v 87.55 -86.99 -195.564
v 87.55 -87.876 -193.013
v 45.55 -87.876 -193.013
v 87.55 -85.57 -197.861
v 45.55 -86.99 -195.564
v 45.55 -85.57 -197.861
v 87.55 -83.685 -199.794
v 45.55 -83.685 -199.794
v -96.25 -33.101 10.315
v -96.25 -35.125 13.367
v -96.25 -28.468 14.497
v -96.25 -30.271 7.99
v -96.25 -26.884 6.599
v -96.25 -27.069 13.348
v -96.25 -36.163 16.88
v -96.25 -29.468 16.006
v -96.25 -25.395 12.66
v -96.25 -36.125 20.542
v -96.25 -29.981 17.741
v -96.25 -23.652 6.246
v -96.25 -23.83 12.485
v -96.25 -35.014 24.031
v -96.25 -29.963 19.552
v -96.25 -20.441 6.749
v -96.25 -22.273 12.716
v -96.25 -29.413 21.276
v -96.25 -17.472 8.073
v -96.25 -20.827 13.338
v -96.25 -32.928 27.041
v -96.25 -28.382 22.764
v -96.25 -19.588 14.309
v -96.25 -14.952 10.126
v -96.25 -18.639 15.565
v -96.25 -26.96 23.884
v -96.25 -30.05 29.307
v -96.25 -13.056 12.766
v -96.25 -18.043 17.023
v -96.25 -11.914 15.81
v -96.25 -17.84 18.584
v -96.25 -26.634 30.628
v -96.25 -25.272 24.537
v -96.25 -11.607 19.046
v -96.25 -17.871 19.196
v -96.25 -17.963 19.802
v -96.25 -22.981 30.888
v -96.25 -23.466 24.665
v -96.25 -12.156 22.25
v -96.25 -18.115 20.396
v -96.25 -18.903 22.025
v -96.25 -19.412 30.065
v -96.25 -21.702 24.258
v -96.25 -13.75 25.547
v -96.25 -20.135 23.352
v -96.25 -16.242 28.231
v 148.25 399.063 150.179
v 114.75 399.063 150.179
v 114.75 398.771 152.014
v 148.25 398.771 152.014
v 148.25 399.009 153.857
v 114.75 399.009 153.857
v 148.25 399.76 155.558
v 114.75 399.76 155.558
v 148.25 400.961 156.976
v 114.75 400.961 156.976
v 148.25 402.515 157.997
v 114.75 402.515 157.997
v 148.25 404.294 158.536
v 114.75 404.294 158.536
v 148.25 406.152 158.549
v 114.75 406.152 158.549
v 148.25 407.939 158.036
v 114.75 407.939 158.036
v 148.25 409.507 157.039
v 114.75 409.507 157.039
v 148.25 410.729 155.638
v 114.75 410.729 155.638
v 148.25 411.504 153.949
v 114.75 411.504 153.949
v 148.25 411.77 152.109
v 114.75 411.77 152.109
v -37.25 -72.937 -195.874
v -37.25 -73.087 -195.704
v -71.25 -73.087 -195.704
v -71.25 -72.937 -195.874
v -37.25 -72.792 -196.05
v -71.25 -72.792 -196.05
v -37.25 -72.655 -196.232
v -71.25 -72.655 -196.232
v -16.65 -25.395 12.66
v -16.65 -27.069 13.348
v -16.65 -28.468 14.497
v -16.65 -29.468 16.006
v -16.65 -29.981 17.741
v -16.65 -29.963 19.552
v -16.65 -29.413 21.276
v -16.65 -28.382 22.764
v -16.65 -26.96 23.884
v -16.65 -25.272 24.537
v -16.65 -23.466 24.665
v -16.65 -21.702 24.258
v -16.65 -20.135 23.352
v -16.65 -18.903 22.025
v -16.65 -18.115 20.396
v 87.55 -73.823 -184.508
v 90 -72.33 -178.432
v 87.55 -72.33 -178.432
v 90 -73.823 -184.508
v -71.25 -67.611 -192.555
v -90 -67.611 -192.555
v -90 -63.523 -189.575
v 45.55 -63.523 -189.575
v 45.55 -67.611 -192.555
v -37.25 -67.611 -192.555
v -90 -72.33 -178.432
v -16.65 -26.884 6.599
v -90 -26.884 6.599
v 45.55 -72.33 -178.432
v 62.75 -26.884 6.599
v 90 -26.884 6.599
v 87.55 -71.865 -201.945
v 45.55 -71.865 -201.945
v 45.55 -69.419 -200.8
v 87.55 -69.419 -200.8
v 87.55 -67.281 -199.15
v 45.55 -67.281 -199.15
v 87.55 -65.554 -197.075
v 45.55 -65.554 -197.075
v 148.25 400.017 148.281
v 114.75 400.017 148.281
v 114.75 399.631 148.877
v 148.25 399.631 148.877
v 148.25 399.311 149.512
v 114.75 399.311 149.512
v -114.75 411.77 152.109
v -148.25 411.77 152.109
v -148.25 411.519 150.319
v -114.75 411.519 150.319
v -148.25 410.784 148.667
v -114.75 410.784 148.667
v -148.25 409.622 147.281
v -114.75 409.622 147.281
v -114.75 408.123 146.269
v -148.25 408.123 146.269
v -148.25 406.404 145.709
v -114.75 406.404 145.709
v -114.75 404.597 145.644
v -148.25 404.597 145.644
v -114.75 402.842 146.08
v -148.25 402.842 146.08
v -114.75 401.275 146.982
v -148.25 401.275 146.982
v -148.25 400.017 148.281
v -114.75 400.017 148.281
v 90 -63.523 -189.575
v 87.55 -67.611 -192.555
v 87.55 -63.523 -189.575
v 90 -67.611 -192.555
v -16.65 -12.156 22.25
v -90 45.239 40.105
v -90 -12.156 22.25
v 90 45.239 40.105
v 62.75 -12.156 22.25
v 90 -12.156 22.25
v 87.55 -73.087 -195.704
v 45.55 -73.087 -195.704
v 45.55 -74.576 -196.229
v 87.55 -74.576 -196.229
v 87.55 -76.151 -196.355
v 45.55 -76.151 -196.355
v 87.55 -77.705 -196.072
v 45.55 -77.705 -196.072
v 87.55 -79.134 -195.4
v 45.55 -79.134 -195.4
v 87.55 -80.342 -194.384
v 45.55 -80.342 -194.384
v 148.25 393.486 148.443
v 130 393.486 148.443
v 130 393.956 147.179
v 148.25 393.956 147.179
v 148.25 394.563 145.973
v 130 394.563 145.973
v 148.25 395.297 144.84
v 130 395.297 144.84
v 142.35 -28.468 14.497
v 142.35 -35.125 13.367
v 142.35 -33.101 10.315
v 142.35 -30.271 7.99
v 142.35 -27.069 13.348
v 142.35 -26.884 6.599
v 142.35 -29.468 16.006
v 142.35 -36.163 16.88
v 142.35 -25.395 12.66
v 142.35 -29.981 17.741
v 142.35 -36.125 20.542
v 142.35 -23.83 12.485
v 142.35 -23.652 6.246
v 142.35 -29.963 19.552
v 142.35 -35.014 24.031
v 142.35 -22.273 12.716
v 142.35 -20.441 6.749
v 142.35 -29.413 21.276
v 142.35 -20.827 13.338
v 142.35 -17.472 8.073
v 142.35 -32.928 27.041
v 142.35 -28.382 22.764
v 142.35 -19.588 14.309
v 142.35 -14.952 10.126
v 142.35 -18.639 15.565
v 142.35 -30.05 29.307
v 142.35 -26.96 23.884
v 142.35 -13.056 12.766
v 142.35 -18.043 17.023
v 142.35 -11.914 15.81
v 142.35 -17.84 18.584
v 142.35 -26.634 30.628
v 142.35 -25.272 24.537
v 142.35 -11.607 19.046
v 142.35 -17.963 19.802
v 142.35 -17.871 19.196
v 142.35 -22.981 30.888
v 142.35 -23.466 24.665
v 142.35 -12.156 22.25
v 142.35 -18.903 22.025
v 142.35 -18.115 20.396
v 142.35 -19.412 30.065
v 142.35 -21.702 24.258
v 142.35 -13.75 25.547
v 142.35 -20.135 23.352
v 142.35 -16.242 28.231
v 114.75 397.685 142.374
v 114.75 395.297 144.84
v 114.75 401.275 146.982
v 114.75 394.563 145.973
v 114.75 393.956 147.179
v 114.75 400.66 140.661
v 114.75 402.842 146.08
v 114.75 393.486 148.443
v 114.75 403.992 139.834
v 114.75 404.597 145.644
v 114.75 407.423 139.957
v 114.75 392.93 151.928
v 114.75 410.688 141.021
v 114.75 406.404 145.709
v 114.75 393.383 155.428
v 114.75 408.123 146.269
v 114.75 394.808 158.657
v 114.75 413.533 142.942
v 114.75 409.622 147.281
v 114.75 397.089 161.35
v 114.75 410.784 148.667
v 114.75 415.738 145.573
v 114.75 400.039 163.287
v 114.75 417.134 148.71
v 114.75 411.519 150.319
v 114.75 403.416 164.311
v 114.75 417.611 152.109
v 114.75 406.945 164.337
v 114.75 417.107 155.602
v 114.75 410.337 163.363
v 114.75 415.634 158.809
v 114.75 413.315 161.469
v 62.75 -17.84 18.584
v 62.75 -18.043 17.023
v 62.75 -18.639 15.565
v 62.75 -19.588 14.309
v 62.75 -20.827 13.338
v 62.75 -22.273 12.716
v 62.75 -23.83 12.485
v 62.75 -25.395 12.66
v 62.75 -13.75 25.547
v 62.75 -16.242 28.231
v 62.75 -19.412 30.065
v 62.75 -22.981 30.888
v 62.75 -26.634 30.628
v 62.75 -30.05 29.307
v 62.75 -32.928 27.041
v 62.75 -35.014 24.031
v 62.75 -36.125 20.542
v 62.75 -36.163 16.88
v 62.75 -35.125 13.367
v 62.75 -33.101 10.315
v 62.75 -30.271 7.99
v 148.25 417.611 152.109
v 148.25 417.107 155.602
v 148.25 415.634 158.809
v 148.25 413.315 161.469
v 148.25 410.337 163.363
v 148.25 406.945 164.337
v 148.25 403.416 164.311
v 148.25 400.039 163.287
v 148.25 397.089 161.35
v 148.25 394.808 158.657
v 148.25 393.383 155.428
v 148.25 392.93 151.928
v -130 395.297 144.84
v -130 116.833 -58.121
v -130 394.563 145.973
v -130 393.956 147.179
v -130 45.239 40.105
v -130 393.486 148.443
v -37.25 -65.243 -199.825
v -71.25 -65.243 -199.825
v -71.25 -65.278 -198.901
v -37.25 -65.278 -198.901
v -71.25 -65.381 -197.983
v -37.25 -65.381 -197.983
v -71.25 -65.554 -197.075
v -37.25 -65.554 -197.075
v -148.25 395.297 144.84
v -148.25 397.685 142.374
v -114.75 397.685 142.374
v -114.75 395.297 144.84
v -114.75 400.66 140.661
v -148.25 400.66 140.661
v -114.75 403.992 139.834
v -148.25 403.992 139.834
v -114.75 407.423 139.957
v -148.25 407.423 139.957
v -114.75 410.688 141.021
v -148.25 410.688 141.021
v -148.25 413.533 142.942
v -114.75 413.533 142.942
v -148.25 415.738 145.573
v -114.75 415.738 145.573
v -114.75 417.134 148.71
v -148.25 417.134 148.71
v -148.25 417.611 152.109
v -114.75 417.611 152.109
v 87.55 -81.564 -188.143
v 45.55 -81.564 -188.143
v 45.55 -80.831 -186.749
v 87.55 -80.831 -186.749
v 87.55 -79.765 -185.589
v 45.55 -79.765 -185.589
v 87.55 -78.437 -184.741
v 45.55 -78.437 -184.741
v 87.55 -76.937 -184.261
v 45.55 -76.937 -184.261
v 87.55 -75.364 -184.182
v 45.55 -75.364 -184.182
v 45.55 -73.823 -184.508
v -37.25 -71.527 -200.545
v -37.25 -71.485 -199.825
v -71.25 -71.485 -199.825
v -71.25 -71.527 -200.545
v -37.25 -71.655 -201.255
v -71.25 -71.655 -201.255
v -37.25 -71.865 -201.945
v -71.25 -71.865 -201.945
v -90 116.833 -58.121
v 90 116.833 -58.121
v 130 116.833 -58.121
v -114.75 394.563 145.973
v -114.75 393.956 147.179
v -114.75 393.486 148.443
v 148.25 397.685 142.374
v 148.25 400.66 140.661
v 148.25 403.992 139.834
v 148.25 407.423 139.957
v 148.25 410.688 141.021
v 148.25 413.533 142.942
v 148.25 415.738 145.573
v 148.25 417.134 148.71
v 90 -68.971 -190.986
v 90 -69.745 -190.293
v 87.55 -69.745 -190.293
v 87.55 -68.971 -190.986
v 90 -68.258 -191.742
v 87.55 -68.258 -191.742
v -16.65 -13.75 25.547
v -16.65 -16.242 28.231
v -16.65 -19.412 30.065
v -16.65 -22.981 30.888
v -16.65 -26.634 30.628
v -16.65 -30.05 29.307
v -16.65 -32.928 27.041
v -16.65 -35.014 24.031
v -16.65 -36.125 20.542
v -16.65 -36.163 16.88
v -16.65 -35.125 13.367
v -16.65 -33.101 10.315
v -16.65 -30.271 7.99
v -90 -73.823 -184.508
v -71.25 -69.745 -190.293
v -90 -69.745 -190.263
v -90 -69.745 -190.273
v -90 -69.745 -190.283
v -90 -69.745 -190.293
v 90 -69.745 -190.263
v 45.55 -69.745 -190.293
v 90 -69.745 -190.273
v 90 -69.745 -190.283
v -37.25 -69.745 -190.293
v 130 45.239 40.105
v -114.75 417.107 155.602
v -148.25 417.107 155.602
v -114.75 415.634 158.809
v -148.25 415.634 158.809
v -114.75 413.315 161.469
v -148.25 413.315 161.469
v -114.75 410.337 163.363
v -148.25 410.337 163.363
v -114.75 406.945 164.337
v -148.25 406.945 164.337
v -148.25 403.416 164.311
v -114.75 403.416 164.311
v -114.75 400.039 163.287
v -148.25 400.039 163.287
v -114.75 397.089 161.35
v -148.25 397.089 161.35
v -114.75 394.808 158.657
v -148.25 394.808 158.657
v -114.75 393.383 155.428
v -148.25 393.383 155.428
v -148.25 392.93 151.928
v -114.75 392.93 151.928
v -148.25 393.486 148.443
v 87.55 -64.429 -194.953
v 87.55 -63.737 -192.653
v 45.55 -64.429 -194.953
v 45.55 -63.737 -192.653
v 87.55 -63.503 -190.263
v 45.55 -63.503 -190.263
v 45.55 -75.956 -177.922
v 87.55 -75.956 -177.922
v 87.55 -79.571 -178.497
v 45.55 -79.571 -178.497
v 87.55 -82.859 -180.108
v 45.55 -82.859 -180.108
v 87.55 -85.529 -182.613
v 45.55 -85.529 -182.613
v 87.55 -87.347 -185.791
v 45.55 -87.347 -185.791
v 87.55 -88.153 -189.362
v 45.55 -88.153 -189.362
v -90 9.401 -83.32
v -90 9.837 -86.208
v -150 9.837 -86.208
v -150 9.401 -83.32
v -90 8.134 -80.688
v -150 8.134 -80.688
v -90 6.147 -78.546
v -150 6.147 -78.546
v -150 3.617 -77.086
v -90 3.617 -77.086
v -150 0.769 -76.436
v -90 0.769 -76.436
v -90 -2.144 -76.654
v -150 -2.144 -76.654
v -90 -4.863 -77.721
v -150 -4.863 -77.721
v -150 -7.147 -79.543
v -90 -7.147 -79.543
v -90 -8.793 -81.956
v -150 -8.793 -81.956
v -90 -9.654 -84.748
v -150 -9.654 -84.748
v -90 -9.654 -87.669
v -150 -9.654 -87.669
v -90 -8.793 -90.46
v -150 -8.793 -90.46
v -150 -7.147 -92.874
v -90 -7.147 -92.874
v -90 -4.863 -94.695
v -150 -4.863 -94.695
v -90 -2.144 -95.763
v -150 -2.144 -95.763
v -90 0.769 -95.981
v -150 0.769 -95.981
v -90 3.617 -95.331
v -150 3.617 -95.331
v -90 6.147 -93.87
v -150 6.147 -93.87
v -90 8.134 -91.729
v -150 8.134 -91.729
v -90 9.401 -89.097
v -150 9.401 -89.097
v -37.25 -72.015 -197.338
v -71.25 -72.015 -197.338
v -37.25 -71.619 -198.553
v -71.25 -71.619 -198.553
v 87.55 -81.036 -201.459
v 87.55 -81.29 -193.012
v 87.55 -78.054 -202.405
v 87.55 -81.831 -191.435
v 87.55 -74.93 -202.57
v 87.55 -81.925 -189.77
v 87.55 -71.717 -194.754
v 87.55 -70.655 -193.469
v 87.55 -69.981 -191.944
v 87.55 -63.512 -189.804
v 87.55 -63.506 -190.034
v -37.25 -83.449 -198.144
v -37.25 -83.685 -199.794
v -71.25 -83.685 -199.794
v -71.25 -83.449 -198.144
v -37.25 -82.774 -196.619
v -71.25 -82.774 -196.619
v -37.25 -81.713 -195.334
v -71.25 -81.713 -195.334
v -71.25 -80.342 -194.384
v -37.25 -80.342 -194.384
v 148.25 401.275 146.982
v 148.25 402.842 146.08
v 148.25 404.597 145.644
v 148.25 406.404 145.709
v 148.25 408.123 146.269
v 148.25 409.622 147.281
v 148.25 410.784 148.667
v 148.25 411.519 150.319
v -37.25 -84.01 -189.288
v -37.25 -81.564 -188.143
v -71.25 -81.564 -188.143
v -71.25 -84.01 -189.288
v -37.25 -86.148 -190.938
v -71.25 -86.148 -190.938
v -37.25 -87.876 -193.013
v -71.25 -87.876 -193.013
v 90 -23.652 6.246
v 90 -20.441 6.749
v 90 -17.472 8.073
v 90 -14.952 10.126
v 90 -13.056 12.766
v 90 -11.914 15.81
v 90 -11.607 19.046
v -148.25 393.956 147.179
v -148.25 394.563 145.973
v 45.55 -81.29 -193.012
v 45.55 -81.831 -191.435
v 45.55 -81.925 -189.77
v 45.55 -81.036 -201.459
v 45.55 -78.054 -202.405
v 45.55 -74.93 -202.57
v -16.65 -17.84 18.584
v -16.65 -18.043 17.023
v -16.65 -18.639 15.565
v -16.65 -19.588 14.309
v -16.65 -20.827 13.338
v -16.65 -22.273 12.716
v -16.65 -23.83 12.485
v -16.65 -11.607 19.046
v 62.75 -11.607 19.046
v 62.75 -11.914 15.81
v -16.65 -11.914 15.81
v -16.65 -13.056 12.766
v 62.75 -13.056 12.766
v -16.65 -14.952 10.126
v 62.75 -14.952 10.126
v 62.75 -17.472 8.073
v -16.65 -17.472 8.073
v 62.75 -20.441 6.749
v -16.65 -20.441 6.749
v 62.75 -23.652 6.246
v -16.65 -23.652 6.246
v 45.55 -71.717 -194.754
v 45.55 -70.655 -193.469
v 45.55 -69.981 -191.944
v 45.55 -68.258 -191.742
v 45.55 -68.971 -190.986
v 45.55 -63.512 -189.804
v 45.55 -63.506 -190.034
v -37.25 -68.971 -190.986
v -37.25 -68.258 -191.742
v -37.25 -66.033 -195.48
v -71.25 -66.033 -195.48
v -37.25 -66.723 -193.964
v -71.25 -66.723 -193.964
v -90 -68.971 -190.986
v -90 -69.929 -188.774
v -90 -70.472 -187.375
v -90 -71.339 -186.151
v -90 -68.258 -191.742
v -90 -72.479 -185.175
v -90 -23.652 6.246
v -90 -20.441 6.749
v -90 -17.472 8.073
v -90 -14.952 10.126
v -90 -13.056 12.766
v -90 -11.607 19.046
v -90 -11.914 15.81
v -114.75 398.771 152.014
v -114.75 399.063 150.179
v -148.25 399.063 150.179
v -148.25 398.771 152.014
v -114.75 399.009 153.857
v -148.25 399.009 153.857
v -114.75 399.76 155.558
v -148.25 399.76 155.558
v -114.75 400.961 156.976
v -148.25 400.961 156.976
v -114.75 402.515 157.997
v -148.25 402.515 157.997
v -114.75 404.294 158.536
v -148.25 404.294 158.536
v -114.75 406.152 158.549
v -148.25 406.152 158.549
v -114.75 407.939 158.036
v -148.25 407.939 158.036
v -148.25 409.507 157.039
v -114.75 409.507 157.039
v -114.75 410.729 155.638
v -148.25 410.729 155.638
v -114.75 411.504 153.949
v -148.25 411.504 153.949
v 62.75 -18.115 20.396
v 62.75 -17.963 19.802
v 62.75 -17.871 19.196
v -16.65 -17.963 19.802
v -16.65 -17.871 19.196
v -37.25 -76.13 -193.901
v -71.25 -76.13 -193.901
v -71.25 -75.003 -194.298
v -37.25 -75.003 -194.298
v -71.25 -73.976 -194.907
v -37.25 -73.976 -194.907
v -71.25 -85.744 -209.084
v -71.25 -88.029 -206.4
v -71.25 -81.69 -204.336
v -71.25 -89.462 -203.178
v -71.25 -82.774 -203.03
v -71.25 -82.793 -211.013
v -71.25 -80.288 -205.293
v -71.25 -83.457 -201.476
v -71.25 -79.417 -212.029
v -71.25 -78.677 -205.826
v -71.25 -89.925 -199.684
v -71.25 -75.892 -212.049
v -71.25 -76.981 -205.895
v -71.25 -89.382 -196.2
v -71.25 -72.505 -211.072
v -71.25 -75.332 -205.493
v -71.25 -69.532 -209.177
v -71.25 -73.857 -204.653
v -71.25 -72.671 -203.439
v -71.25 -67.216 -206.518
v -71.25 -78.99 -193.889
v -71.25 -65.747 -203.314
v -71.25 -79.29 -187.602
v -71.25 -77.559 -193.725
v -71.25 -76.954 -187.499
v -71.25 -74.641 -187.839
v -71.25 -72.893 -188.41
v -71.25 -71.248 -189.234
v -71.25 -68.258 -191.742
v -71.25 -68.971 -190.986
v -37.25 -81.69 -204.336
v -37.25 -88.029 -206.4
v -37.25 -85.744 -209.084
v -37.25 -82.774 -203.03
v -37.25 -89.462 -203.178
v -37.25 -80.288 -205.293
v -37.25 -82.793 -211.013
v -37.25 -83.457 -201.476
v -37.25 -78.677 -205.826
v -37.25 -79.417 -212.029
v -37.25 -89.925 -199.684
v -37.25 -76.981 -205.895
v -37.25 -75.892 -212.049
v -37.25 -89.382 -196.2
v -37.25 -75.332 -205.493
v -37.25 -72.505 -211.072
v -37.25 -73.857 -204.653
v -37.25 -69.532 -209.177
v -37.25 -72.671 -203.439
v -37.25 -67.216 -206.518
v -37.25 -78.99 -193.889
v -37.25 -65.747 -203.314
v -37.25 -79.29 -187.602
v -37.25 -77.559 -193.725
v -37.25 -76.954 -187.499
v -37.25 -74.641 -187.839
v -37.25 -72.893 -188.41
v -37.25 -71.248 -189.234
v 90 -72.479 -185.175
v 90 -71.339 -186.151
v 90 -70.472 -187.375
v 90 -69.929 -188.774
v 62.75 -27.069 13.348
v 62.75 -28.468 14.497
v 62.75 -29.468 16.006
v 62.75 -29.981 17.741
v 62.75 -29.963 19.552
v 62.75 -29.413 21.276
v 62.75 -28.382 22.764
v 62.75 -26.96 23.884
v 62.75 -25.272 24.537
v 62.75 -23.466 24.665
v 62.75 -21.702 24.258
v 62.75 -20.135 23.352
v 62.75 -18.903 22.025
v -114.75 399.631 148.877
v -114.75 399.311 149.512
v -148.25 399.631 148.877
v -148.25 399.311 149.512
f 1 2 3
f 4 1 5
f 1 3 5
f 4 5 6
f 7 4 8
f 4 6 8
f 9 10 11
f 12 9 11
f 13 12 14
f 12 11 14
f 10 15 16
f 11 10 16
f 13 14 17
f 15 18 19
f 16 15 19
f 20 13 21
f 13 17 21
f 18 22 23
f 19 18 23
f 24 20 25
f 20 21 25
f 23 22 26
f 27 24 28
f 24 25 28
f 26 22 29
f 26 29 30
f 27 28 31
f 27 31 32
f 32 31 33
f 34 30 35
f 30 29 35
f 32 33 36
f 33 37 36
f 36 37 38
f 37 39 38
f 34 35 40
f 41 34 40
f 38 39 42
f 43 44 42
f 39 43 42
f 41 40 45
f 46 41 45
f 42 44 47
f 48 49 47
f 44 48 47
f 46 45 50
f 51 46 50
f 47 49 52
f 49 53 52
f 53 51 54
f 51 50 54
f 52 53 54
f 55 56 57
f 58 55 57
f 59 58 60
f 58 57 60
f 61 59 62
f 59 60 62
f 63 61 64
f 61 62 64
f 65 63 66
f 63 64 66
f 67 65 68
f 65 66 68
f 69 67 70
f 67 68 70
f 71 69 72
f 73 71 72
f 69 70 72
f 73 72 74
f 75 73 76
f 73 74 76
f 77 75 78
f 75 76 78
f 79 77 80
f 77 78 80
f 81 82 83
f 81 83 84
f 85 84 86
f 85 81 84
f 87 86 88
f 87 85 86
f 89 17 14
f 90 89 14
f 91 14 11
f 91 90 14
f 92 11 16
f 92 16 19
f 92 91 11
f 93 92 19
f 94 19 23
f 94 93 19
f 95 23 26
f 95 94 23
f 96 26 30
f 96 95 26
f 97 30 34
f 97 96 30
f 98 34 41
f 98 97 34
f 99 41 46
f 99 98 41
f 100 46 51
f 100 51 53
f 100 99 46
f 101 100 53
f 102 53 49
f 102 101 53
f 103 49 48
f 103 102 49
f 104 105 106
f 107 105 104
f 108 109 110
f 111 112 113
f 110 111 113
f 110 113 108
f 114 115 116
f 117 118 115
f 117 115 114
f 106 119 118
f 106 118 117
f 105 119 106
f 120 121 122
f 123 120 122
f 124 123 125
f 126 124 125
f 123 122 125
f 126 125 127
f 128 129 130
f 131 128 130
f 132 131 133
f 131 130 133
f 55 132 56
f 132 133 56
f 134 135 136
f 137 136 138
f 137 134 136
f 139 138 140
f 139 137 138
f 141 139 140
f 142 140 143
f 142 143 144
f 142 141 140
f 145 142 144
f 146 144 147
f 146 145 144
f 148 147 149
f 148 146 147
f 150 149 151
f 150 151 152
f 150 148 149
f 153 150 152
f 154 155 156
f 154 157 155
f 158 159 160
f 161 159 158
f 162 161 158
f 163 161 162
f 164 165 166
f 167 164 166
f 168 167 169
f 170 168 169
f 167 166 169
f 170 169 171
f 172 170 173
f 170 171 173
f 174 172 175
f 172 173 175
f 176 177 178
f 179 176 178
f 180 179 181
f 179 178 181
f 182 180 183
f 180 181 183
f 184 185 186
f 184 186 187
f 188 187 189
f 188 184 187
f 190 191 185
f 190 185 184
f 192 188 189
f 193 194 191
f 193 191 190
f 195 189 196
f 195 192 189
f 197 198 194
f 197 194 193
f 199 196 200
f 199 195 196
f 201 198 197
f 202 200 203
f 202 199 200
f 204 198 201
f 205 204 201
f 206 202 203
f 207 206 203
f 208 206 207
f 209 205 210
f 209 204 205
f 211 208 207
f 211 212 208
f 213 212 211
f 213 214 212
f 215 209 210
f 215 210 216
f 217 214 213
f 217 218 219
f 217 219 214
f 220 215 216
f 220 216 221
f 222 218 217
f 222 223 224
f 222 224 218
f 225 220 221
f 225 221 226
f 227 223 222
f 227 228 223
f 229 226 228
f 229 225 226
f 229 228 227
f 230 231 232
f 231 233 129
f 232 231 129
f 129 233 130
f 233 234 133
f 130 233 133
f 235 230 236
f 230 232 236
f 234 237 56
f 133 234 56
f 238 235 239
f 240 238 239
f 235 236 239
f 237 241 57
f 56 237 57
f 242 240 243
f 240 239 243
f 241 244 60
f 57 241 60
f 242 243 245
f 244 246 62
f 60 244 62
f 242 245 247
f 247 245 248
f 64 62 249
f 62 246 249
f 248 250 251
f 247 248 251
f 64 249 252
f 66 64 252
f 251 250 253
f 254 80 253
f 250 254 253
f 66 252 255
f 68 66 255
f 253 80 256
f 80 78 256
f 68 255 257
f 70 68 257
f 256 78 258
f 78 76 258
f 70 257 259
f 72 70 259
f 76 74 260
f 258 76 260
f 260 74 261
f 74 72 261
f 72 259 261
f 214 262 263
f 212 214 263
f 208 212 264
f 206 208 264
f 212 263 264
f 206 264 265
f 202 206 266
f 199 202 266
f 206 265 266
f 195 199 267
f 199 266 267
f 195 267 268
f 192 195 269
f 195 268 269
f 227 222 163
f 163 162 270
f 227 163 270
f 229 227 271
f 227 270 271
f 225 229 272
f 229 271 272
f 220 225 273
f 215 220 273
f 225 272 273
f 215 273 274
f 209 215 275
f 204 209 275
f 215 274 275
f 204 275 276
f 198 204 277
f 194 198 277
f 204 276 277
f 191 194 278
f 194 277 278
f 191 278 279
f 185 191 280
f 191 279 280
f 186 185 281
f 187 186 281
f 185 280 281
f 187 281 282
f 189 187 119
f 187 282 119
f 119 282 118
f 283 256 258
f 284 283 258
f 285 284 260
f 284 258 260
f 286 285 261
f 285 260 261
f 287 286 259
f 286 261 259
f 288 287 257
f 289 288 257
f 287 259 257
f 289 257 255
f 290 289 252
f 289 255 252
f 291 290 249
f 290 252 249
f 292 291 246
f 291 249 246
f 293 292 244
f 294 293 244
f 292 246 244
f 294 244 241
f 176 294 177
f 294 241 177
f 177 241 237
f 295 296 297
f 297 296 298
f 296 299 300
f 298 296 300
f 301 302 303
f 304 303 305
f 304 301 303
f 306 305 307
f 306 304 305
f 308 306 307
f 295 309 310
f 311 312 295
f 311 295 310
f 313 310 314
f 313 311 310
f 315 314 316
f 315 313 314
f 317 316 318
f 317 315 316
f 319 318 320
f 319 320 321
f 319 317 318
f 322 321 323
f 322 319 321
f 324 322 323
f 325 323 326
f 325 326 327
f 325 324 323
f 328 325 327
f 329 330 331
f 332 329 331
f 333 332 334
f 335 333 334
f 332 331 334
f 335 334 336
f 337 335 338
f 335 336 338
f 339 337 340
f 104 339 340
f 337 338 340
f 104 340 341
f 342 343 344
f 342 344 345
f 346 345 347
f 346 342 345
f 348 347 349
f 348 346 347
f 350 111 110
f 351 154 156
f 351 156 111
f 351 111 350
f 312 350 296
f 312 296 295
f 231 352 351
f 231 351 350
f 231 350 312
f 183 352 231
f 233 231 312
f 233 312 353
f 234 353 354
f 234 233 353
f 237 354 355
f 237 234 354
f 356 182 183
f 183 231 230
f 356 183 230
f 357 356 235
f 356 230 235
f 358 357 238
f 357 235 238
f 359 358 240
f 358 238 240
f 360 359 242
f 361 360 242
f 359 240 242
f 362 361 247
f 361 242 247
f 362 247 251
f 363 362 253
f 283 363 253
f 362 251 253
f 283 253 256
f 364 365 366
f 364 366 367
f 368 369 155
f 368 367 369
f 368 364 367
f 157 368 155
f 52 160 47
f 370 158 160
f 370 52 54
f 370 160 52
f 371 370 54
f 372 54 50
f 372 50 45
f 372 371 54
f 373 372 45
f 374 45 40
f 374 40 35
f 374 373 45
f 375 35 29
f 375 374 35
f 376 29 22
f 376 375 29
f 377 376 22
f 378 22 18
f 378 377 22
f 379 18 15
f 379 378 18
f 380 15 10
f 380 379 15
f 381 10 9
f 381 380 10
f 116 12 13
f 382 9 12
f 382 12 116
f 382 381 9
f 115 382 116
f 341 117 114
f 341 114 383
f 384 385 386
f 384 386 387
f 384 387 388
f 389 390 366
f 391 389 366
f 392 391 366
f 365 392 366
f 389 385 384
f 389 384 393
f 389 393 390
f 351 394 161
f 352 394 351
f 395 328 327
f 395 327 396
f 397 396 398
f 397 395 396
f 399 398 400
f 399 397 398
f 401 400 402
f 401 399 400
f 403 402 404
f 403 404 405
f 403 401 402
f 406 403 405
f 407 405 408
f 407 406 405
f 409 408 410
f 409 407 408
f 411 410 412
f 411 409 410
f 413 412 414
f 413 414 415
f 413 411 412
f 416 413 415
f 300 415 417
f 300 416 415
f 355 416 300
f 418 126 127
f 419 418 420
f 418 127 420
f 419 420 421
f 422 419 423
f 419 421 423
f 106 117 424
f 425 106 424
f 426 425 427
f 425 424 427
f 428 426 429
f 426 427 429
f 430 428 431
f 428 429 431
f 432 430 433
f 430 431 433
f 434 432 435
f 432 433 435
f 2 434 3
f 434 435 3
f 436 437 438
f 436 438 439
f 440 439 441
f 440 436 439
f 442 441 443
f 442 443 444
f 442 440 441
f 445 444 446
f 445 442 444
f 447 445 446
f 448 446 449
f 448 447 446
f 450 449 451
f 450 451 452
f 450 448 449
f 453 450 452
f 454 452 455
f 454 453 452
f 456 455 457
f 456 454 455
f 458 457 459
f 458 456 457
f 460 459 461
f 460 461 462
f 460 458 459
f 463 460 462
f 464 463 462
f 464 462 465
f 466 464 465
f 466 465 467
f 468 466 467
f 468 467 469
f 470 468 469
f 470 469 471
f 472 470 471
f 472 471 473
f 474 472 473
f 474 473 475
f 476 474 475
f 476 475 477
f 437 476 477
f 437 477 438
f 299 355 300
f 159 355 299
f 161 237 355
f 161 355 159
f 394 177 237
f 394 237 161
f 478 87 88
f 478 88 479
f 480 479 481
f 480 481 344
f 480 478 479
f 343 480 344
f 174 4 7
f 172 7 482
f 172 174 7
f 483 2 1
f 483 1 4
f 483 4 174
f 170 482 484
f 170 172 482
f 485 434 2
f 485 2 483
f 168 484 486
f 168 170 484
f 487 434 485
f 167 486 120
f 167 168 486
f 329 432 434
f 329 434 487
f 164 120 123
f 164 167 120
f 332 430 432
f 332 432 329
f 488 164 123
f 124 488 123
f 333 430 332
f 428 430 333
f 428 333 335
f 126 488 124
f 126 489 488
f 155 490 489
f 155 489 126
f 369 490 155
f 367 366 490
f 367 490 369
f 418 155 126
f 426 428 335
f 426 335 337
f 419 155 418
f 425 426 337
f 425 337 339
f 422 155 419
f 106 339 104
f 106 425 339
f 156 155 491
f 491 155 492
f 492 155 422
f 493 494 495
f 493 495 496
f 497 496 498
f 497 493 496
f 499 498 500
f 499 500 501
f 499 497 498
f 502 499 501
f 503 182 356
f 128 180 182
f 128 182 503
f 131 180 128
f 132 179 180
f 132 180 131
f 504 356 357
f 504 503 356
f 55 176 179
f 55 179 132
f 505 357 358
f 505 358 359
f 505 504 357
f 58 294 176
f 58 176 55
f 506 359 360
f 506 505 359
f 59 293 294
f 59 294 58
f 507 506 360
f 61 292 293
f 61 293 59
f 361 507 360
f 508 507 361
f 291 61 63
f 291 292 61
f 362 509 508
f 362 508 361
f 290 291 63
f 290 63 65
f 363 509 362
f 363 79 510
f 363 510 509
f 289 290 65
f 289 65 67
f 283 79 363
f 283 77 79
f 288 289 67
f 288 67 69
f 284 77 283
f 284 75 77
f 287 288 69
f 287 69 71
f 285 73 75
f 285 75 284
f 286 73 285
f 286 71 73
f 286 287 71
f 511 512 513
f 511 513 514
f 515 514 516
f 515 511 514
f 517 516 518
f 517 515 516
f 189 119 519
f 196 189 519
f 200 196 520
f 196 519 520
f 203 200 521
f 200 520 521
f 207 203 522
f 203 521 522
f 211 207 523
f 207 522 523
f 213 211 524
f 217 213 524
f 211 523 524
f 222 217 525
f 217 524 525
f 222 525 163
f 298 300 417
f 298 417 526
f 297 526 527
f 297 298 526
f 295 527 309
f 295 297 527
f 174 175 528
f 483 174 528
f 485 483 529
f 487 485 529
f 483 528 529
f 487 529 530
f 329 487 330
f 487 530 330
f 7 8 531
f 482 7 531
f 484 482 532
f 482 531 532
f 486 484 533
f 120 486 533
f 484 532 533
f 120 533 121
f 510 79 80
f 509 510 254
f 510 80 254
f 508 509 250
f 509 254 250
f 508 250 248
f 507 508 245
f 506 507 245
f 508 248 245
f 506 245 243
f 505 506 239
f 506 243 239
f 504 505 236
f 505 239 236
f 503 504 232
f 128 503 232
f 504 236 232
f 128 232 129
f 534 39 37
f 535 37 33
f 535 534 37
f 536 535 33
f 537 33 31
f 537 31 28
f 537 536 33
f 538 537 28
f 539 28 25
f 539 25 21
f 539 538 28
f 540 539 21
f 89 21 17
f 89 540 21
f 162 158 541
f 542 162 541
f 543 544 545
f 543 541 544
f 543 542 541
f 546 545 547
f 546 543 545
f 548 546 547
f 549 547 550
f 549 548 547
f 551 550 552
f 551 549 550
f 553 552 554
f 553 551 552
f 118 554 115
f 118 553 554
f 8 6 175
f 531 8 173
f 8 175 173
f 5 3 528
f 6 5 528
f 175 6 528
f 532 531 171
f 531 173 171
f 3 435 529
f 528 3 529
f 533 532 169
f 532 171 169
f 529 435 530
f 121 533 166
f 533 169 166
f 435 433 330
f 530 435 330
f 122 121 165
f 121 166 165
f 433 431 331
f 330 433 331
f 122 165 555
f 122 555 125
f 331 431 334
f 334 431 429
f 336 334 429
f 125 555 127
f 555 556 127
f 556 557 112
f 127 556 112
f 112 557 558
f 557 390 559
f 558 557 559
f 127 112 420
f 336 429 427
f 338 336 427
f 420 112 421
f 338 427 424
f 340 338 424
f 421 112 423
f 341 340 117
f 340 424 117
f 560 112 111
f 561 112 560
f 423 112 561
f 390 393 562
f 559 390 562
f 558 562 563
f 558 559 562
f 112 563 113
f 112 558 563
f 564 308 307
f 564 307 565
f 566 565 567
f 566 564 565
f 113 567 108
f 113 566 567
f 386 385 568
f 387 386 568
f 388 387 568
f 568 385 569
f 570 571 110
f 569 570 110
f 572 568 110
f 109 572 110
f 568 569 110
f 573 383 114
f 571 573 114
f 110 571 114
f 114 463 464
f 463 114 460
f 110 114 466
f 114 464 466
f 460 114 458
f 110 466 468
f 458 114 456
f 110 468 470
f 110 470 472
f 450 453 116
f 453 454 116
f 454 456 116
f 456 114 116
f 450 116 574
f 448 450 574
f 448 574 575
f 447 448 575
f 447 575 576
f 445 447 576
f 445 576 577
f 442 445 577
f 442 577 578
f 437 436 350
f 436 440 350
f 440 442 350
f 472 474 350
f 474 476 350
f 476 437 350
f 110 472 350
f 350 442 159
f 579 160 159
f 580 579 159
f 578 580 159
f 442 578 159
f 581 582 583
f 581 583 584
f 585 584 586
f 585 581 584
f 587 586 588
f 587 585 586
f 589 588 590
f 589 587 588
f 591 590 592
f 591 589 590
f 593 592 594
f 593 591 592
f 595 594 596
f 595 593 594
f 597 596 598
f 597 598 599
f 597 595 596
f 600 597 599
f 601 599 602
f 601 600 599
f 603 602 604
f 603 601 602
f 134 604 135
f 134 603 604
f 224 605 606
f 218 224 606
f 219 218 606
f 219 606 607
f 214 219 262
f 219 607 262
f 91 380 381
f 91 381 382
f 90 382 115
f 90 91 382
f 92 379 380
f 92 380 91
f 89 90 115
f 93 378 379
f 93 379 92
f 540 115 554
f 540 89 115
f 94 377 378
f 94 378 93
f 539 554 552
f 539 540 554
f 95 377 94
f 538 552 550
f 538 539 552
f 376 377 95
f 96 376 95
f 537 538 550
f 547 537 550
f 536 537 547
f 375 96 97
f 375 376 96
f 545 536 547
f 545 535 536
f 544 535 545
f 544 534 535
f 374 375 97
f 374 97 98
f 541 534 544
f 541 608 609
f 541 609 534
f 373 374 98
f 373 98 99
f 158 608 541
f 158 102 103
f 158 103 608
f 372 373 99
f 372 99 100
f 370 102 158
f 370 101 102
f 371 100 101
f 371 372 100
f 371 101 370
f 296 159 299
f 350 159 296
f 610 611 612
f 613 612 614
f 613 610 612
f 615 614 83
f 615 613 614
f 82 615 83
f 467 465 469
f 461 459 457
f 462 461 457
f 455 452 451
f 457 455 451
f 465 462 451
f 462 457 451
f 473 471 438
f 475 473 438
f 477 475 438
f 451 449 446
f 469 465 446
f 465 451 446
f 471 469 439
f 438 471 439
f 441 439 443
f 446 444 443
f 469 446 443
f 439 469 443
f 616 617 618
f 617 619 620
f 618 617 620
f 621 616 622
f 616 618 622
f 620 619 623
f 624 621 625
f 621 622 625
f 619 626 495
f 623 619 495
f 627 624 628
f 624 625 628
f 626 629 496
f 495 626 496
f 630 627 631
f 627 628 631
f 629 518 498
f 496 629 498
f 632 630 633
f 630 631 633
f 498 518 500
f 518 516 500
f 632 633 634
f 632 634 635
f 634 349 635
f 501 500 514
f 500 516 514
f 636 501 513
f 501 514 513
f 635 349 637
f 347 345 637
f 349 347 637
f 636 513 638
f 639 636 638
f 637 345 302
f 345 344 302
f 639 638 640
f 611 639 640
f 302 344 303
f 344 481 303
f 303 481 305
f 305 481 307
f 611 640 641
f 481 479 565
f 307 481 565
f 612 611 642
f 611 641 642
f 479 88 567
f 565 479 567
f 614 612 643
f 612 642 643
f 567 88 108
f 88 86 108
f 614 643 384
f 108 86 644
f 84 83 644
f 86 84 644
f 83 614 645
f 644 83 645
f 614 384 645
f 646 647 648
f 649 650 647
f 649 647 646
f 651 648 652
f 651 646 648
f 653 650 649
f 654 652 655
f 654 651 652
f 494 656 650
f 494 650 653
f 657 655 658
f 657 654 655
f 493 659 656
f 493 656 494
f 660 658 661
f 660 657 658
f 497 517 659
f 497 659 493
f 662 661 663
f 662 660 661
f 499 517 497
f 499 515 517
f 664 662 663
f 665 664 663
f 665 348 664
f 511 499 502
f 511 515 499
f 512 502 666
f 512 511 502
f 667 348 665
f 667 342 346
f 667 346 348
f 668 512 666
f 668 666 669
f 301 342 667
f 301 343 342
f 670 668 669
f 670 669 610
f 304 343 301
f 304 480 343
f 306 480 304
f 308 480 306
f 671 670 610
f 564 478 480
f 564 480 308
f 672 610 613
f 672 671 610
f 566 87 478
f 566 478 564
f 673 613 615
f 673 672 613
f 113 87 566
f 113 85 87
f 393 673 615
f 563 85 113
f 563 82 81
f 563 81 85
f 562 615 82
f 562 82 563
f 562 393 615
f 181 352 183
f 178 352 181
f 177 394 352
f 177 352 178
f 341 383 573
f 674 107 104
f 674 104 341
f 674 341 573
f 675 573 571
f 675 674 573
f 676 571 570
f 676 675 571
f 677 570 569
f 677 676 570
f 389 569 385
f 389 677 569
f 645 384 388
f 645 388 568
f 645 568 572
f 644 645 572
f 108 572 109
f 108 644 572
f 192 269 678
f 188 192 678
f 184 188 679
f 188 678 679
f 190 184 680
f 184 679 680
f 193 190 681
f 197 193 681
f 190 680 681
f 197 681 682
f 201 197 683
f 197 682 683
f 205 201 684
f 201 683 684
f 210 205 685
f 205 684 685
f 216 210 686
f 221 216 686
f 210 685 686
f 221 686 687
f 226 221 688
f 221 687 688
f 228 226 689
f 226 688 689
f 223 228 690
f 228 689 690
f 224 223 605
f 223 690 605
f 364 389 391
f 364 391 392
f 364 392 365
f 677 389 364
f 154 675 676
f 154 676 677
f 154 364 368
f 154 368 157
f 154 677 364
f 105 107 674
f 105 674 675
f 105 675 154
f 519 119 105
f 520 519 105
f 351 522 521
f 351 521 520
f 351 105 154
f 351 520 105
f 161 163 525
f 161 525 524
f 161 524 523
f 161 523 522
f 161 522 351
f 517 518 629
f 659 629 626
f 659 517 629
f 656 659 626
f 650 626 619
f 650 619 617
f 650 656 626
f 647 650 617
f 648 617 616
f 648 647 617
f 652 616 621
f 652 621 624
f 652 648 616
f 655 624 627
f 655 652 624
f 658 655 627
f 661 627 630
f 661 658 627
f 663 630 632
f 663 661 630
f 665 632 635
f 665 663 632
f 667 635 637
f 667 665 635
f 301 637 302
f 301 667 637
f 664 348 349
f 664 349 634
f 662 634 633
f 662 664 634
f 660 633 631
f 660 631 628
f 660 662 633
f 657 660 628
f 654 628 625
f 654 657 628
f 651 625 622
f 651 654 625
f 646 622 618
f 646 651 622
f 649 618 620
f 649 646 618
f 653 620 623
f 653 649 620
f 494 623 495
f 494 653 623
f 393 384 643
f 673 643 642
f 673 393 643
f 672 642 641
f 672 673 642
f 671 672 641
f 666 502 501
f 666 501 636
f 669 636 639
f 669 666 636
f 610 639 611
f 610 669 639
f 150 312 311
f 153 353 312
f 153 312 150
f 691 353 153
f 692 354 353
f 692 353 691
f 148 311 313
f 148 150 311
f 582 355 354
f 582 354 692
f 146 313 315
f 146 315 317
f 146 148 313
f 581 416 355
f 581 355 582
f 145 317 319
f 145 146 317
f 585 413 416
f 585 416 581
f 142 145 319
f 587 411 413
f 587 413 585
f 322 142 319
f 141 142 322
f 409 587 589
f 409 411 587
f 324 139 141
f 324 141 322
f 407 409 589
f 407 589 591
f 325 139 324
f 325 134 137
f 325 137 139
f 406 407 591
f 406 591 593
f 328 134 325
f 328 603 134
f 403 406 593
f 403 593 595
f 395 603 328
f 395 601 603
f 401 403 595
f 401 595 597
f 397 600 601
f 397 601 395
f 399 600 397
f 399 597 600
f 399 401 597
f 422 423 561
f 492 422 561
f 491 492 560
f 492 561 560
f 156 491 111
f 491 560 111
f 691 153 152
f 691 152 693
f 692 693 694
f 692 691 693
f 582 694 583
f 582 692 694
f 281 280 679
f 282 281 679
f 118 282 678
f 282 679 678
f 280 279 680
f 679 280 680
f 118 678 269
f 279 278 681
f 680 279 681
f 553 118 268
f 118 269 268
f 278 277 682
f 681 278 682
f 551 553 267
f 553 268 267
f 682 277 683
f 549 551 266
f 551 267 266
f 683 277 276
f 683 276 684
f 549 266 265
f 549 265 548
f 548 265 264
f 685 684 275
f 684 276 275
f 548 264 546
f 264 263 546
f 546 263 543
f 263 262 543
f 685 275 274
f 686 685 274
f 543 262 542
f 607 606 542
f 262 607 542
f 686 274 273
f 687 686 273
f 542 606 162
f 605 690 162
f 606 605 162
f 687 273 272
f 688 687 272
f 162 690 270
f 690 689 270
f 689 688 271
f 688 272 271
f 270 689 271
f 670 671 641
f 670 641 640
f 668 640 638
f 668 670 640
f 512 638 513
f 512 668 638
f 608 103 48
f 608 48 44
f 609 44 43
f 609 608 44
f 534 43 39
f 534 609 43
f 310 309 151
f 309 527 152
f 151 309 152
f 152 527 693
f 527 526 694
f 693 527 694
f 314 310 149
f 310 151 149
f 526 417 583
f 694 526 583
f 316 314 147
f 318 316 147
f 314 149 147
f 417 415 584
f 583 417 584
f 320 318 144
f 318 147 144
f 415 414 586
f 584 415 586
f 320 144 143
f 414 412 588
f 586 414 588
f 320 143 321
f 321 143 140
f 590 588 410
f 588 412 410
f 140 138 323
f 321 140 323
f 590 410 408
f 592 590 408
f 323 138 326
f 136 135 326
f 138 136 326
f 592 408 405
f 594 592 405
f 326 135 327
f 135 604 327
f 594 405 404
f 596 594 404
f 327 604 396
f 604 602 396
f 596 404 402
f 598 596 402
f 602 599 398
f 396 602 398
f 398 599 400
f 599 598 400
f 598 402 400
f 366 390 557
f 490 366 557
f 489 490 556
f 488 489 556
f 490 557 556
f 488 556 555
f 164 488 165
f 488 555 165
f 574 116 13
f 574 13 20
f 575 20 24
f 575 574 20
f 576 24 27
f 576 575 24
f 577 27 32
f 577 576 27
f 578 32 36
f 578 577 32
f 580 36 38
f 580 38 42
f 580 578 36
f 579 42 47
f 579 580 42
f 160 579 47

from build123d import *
from build123d import SkipClean  # not in build123d's __all__

# Parameters (mm, degrees)
F1_START = -16.65
F1_DEPTH = 79.6
F2_START = -37.25
F2_DEPTH = 34
F3_START = -114.75
F3_DEPTH = 33.5
F4_START = 62.75
F4_DEPTH = 79.6
F5_START = 45.55
F5_DEPTH = 42
F0_R     = 9.8
F6_DEPTH = 150
F8_DEPTH = 90
F9_DEPTH = 130


# Not quite as in the source:
# - after a boolean that leaves OpenCascade's solid faulty, fix() repairs it


with BuildPart() as f1:
    # F0 (on Right) → F1 (new body)
    with BuildSketch(Plane.YZ.offset(F1_START)):
        with BuildLine():
            Line((-18.1152243821, 20.3958344616), (-12.1555414908, 22.2498694633))
            ThreePointArc((-12.1555414908, 22.2498694633), (-32.9276080285, 27.0414189792), (-26.8836398395, 6.5986172255))
            Line((-26.8836398395, 6.5986172255), (-25.3948918397, 12.6598790865))
            ThreePointArc((-25.3948918397, 12.6598790865), (-28.3822482179, 22.7641569875), (-18.1152243821, 20.3958344616))
        make_face()
        with BuildLine():
            ThreePointArc((-26.8836398395, 6.5986172255), (-16.3247484731, 8.8719395429), (-11.5984598892, 18.5838074099))
            ThreePointArc((-11.5984598892, 18.5838074099), (-11.7385251038, 20.4378806886), (-12.1555414908, 22.2498694633))
            Line((-12.1555414908, 22.2498694633), (-18.1152243821, 20.3958344616))
            ThreePointArc((-18.1152243821, 20.3958344616), (-17.9091054013, 19.5002215043), (-17.8398752699, 18.5838074099))
            ThreePointArc((-17.8398752699, 18.5838074099), (-20.1759412293, 13.7835156961), (-25.3948918397, 12.6598790865))
            Line((-25.3948918397, 12.6598790865), (-26.8836398395, 6.5986172255))
        make_face()
    extrude(amount=-F1_DEPTH)



with BuildPart() as f2:
    # F0 (on Right) → F2 (new body)
    with BuildSketch(Plane.YZ.offset(F2_START)):
        with BuildLine():
            Line((-72.6551036638, -196.2316651642), (-67.6112595051, -192.5554031964))
            ThreePointArc((-67.6112595051, -192.5554031964), (-68.6065299554, -191.356834242), (-69.7448706932, -190.2932031158))
            ThreePointArc((-69.7448706932, -190.2932031158), (-70.6550390715, -193.4685207262), (-73.0869940433, -195.7038380233))
            ThreePointArc((-73.0869940433, -195.7038380233), (-72.8636664269, -195.9617109817), (-72.6551036638, -196.2316651642))
        make_face()
        with BuildLine():
            ThreePointArc((-69.7448706932, -190.2932031158), (-72.0550616531, -188.7913185641), (-74.6409019404, -187.8394417408))
            Line((-74.6409019404, -187.8394417408), (-76.1296499401, -193.9007036018))
            ThreePointArc((-76.1296499401, -193.9007036018), (-74.4747709929, -194.5769133854), (-73.0869940433, -195.7038380233))
            ThreePointArc((-73.0869940433, -195.7038380233), (-70.6550390715, -193.4685207262), (-69.7448706932, -190.2932031158))
        make_face()
        with BuildLine():
            Line((-76.1296499401, -193.9007036018), (-74.6409019404, -187.8394417408))
            ThreePointArc((-74.6409019404, -187.8394417408), (-78.1243753606, -187.4950233364), (-81.5644298108, -188.1425080744))
            ThreePointArc((-81.5644298108, -188.1425080744), (-81.831132306, -191.4349111758), (-80.3424675585, -194.3836271121))
            ThreePointArc((-80.3424675585, -194.3836271121), (-78.2793719358, -193.7643196914), (-76.1296499401, -193.9007036018))
        make_face()
        with BuildLine():
            ThreePointArc((-81.5644298108, -188.1425080744), (-85.124263165, -190.0540118898), (-87.8759224883, -193.012834513))
            ThreePointArc((-87.8759224883, -193.012834513), (-86.3429062121, -196.7512996317), (-83.6845909086, -199.7942620195))
            ThreePointArc((-83.6845909086, -199.7942620195), (-82.7744225302, -196.6189444092), (-80.3424675585, -194.3836271121))
            ThreePointArc((-80.3424675585, -194.3836271121), (-81.831132306, -191.4349111758), (-81.5644298108, -188.1425080744))
        make_face()
        with BuildLine():
            ThreePointArc((-83.6845909086, -199.7942620195), (-86.3429062121, -196.7512996317), (-87.8759224883, -193.012834513))
            ThreePointArc((-87.8759224883, -193.012834513), (-81.1414817132, -211.6423981781), (-65.2432511293, -199.8246319252))
            ThreePointArc((-65.2432511293, -199.8246319252), (-65.3210684593, -198.4409063564), (-65.5535391134, -197.0746306224))
            ThreePointArc((-65.5535391134, -197.0746306224), (-68.3051984367, -200.0334532455), (-71.865031791, -201.944957061))
            ThreePointArc((-71.865031791, -201.944957061), (-78.6766955162, -205.8260878027), (-83.6845909086, -199.7942620195))
        make_face()
        with BuildLine():
            ThreePointArc((-65.5535391134, -197.0746306224), (-66.3527593839, -194.7104559496), (-67.6112595051, -192.5554031964))
            Line((-67.6112595051, -192.5554031964), (-72.6551036638, -196.2316651642))
            ThreePointArc((-72.6551036638, -196.2316651642), (-71.7846521409, -197.9352316714), (-71.48466651, -199.8246319252))
            ThreePointArc((-71.48466651, -199.8246319252), (-71.5805107914, -200.9017178582), (-71.865031791, -201.944957061))
            ThreePointArc((-71.865031791, -201.944957061), (-68.3051984367, -200.0334532455), (-65.5535391134, -197.0746306224))
        make_face()
    extrude(amount=-F2_DEPTH)


with BuildPart() as f3:
    # F0 (on Right) → F3 (new body)
    with BuildSketch(Plane.YZ.offset(F3_START)):
        with BuildLine():
            Line((399.0634596914, 150.1785588691), (393.4857211205, 148.4433453134))
            ThreePointArc((393.4857211205, 148.4433453134), (394.2430188732, 146.5672949475), (395.2966478948, 144.840178638))
            Line((395.2966478948, 144.840178638), (400.0172420308, 148.2808362281))
            ThreePointArc((400.0172420308, 148.2808362281), (399.4623147045, 149.1904771133), (399.0634596914, 150.1785588691))
        make_face()
        with BuildLine():
            ThreePointArc((417.6114702803, 152.1094073668), (403.415981621, 164.3107575329), (393.4857211205, 148.4433453134))
            Line((393.4857211205, 148.4433453134), (399.0634596914, 150.1785588691))
            ThreePointArc((399.0634596914, 150.1785588691), (404.2935480778, 158.5356375547), (411.7700548997, 152.1094073668))
            ThreePointArc((411.7700548997, 152.1094073668), (407.2833502521, 145.9290641867), (400.0172420308, 148.2808362281))
            Line((400.0172420308, 148.2808362281), (395.2966478948, 144.840178638))
            ThreePointArc((395.2966478948, 144.840178638), (409.0926570886, 140.3749177698), (417.6114702803, 152.1094073668))
        make_face()
    extrude(amount=-F3_DEPTH)


with BuildPart() as f4:
    # F0 (on Right) → F4 (new body)
    with BuildSketch(Plane.YZ.offset(F4_START)):
        with BuildLine():
            Line((-18.1152243821, 20.3958344616), (-12.1555414908, 22.2498694633))
            ThreePointArc((-12.1555414908, 22.2498694633), (-32.9276080285, 27.0414189792), (-26.8836398395, 6.5986172255))
            Line((-26.8836398395, 6.5986172255), (-25.3948918397, 12.6598790865))
            ThreePointArc((-25.3948918397, 12.6598790865), (-28.3822482179, 22.7641569875), (-18.1152243821, 20.3958344616))
        make_face()
        with BuildLine():
            ThreePointArc((-26.8836398395, 6.5986172255), (-16.3247484731, 8.8719395429), (-11.5984598892, 18.5838074099))
            ThreePointArc((-11.5984598892, 18.5838074099), (-11.7385251038, 20.4378806886), (-12.1555414908, 22.2498694633))
            Line((-12.1555414908, 22.2498694633), (-18.1152243821, 20.3958344616))
            ThreePointArc((-18.1152243821, 20.3958344616), (-17.9091054013, 19.5002215043), (-17.8398752699, 18.5838074099))
            ThreePointArc((-17.8398752699, 18.5838074099), (-20.1759412293, 13.7835156961), (-25.3948918397, 12.6598790865))
            Line((-25.3948918397, 12.6598790865), (-26.8836398395, 6.5986172255))
        make_face()
    extrude(amount=F4_DEPTH)


with BuildPart() as f5:
    # F0 (on Right) → F5 (new body)
    with BuildSketch(Plane.YZ.offset(F5_START)):
        with BuildLine():
            ThreePointArc((-65.5535391134, -197.0746306224), (-66.3527593839, -194.7104559496), (-67.6112595051, -192.5554031964))
            Line((-67.6112595051, -192.5554031964), (-72.6551036638, -196.2316651642))
            ThreePointArc((-72.6551036638, -196.2316651642), (-71.7846521409, -197.9352316714), (-71.48466651, -199.8246319252))
            ThreePointArc((-71.48466651, -199.8246319252), (-71.5805107914, -200.9017178582), (-71.865031791, -201.944957061))
            ThreePointArc((-71.865031791, -201.944957061), (-68.3051984367, -200.0334532455), (-65.5535391134, -197.0746306224))
        make_face()
        with BuildLine():
            Line((-72.6551036638, -196.2316651642), (-67.6112595051, -192.5554031964))
            ThreePointArc((-67.6112595051, -192.5554031964), (-68.6065299554, -191.356834242), (-69.7448706932, -190.2932031158))
            ThreePointArc((-69.7448706932, -190.2932031158), (-70.6550390715, -193.4685207262), (-73.0869940433, -195.7038380233))
            ThreePointArc((-73.0869940433, -195.7038380233), (-72.8636664269, -195.9617109817), (-72.6551036638, -196.2316651642))
        make_face()
        with BuildLine():
            ThreePointArc((-63.5033797112, -190.2628332101), (-63.5081721417, -189.9189323753), (-63.5225457113, -189.5752986283))
            Line((-63.5225457113, -189.5752986283), (-67.6112595051, -192.5554031964))
            ThreePointArc((-67.6112595051, -192.5554031964), (-66.3527593839, -194.7104559496), (-65.5535391134, -197.0746306224))
            ThreePointArc((-65.5535391134, -197.0746306224), (-64.0270288389, -193.8196484134), (-63.5033797112, -190.2628332101))
        make_face()
        with BuildLine():
            ThreePointArc((-63.5225457113, -189.5752986283), (-66.1627938734, -182.6097693789), (-72.3303718412, -178.4323910032))
            Line((-72.3303718412, -178.4323910032), (-73.8225887621, -184.5077761678))
            ThreePointArc((-73.8225887621, -184.5077761678), (-70.8675740493, -186.7361817254), (-69.7447950918, -190.2628332101))
            ThreePointArc((-69.7447950918, -190.2628332101), (-69.7448139922, -190.27801821), (-69.7448706932, -190.2932031158))
            ThreePointArc((-69.7448706932, -190.2932031158), (-68.6065299554, -191.356834242), (-67.6112595051, -192.5554031964))
            Line((-67.6112595051, -192.5554031964), (-63.5225457113, -189.5752986283))
        make_face()
        with BuildLine():
            Line((-73.8225887621, -184.5077761678), (-72.3303718412, -178.4323910032))
            ThreePointArc((-72.3303718412, -178.4323910032), (-84.2875964997, -181.261186806), (-87.8759224883, -193.012834513))
            ThreePointArc((-87.8759224883, -193.012834513), (-85.124263165, -190.0540118898), (-81.5644298108, -188.1425080744))
            ThreePointArc((-81.5644298108, -188.1425080744), (-78.4371999949, -184.7411091299), (-73.8225887621, -184.5077761678))
        make_face()
        with BuildLine():
            ThreePointArc((-81.5644298108, -188.1425080744), (-85.124263165, -190.0540118898), (-87.8759224883, -193.012834513))
            ThreePointArc((-87.8759224883, -193.012834513), (-86.3429062121, -196.7512996317), (-83.6845909086, -199.7942620195))
            ThreePointArc((-83.6845909086, -199.7942620195), (-82.7744225302, -196.6189444092), (-80.3424675585, -194.3836271121))
            ThreePointArc((-80.3424675585, -194.3836271121), (-81.831132306, -191.4349111758), (-81.5644298108, -188.1425080744))
        make_face()
        with BuildLine():
            ThreePointArc((-80.3424675585, -194.3836271121), (-82.7744225302, -196.6189444092), (-83.6845909086, -199.7942620195))
            ThreePointArc((-83.6845909086, -199.7942620195), (-78.0541694481, -202.4048758122), (-71.865031791, -201.944957061))
            ThreePointArc((-71.865031791, -201.944957061), (-71.5805107914, -200.9017178582), (-71.48466651, -199.8246319252))
            ThreePointArc((-71.48466651, -199.8246319252), (-71.7846521409, -197.9352316714), (-72.6551036638, -196.2316651642))
            Line((-72.6551036638, -196.2316651642), (-77.58466651, -199.8246319252))
            Line((-77.58466651, -199.8246319252), (-76.7189272385, -196.2998766082))
            ThreePointArc((-76.7189272385, -196.2998766082), (-78.6964742873, -195.6552283891), (-80.3424675585, -194.3836271121))
        make_face()
        with BuildLine():
            Line((-77.58466651, -199.8246319252), (-72.6551036638, -196.2316651642))
            ThreePointArc((-72.6551036638, -196.2316651642), (-72.8636664269, -195.9617109817), (-73.0869940433, -195.7038380233))
            ThreePointArc((-73.0869940433, -195.7038380233), (-74.8569349642, -196.2823126202), (-76.7189272385, -196.2998766082))
            Line((-76.7189272385, -196.2998766082), (-77.58466651, -199.8246319252))
        make_face()
    extrude(amount=F5_DEPTH)


with BuildPart() as f6:
    # F0 (on Right) → F6 (new body)
    with BuildSketch(Plane.YZ):
        with Locations((0.0366982566, -86.2082434429)):
            Circle(F0_R)
    extrude(amount=-F6_DEPTH)


with BuildPart() as f7_1:
    # F7: instance of F3
    add(f3.part.mirror(Plane.YZ), clean=False)


with BuildPart() as f1_1:
    add(f1.part, clean=False)

    with SkipClean():  # cleaning this boolean's faces spoils the solid; the shape is the same uncleaned
        add(f2.part)  # F8 merges F2

    with SkipClean():  # cleaning this boolean's faces spoils the solid; the shape is the same uncleaned
        add(f4.part)  # F8 merges F4

    with SkipClean():  # cleaning this boolean's faces spoils the solid; the shape is the same uncleaned
        add(f5.part)  # F8 merges F5

    with SkipClean():  # cleaning this boolean's faces spoils the solid; the shape is the same uncleaned
        add(f6.part)  # F8 merges F6
    # F0 (on Right) → F8 (join, symmetric)
    with BuildSketch(Plane.YZ):
        with BuildLine():
            ThreePointArc((-12.1555414908, 22.2498694633), (-11.7385251038, 20.4378806886), (-11.5984598892, 18.5838074099))
            ThreePointArc((-11.5984598892, 18.5838074099), (-16.3247484731, 8.8719395429), (-26.8836398395, 6.5986172255))
            Line((-26.8836398395, 6.5986172255), (-72.3303718412, -178.4323910032))
            ThreePointArc((-72.3303718412, -178.4323910032), (-66.1627938734, -182.6097693789), (-63.5225457113, -189.5752986283))
            Line((-63.5225457113, -189.5752986283), (116.8328210509, -58.1212816783))
            Line((116.8328210509, -58.1212816783), (45.2393521867, 40.1052056848))
            Line((45.2393521867, 40.1052056848), (-12.1555414908, 22.2498694633))
        make_face()
        with Locations((0.0366982566, -86.2082434429)):
            Circle(F0_R, mode=Mode.SUBTRACT)
        with Locations((0.0366982566, -86.2082434429)):
            Circle(F0_R)
        with BuildLine():
            ThreePointArc((-63.5225457113, -189.5752986283), (-66.1627938734, -182.6097693789), (-72.3303718412, -178.4323910032))
            Line((-72.3303718412, -178.4323910032), (-73.8225887621, -184.5077761678))
            ThreePointArc((-73.8225887621, -184.5077761678), (-70.8675740493, -186.7361817254), (-69.7447950918, -190.2628332101))
            ThreePointArc((-69.7447950918, -190.2628332101), (-69.7448139922, -190.27801821), (-69.7448706932, -190.2932031158))
            ThreePointArc((-69.7448706932, -190.2932031158), (-68.6065299554, -191.356834242), (-67.6112595051, -192.5554031964))
            Line((-67.6112595051, -192.5554031964), (-63.5225457113, -189.5752986283))
        make_face()
    with SkipClean():  # cleaning this boolean's faces spoils the solid; the shape is the same uncleaned
        extrude(amount=F8_DEPTH, both=True)


    add(f3.part)  # F9 merges F3

    add(f7_1.part)  # F9 merges F7_1
    # F0 (on Right) → F9 (join, symmetric)
    with BuildSketch(Plane.YZ):
        with BuildLine():
            Line((393.4857211205, 148.4433453134), (45.2393521867, 40.1052056848))
            Line((45.2393521867, 40.1052056848), (116.8328210509, -58.1212816783))
            Line((116.8328210509, -58.1212816783), (395.2966478948, 144.840178638))
            ThreePointArc((395.2966478948, 144.840178638), (394.2430188732, 146.5672949475), (393.4857211205, 148.4433453134))
        make_face()
    extrude(amount=F9_DEPTH, both=True)

    add(f1_1.part.fix(), mode=Mode.REPLACE)


solid = f1_1.part
